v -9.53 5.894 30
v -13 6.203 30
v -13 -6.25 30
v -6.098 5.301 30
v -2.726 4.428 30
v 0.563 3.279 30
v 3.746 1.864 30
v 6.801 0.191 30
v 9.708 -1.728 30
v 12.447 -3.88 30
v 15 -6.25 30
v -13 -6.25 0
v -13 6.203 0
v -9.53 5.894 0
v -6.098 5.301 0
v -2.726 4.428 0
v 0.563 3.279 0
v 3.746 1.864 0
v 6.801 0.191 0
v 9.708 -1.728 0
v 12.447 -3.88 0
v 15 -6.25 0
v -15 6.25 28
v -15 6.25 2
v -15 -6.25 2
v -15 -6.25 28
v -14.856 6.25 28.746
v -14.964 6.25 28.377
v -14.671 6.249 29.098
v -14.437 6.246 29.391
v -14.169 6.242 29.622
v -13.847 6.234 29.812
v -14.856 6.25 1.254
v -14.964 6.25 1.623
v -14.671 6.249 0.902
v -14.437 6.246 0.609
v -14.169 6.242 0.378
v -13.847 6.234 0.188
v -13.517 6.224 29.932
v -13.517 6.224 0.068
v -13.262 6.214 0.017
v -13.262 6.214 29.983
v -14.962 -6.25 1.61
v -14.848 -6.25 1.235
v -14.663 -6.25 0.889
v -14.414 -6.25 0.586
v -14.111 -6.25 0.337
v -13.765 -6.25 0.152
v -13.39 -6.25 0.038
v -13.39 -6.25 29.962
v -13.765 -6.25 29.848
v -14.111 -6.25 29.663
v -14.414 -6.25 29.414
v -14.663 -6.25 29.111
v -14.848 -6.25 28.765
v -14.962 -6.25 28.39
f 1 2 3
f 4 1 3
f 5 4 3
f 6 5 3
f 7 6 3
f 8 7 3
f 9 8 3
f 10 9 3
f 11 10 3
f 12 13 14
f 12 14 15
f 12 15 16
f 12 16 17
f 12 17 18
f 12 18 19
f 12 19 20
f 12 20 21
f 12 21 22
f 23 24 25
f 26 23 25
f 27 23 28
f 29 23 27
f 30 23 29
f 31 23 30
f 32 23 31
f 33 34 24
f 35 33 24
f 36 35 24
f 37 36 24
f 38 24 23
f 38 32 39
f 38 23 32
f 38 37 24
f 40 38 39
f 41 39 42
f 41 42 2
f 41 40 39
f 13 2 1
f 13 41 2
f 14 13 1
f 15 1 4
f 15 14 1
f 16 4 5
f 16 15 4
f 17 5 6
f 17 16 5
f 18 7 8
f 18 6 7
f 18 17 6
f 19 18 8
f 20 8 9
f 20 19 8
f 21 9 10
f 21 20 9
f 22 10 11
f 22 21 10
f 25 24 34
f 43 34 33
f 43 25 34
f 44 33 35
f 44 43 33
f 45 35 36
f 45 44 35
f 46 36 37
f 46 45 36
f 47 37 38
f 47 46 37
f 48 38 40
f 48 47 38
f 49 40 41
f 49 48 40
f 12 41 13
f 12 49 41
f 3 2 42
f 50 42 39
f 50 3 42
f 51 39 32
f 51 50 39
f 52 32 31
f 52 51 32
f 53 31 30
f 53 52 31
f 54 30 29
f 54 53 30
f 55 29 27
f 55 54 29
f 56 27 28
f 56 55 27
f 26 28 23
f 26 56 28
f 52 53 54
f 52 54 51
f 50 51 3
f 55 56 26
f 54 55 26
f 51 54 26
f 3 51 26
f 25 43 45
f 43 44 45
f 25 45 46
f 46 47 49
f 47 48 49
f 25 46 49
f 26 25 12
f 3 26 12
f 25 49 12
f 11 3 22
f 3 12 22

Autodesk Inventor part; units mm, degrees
ref_plane "YZ Plane" through (0, 0, 0) normal (1, 0, 0) x (0, 1, 0)
ref_plane "XZ Plane" through (0, 0, 0) normal (0, 1, 0) x (-1, 0, 0)
ref_plane "XY Plane" through (0, 0, 0) normal (0, 0, 1) x (1, 0, 0)
sketch "Sketch1" plane through (0, 0, 0) normal (0, 0, 1) x (1, 0, 0)
  line L0 (-15, -6.25) -> (15, -6.25)
  line L1 (15, -6.25) -> (15, 6.25)
  line L2 (15, 6.25) -> (-15, 6.25)
  line L3 (-15, 6.25) -> (-15, -6.25)
  line L4 (-15, -6.25) -> (15, 6.25) construction
  line L5 (15, -6.25) -> (-15, 6.25) construction
  arc A0 (15, -6.25) -> (-15, 6.25) centre (-15, -36) ccw
  point P0 (0, 0)
  dimension "d0" = 30
  dimension "d1" = 12.5
extrude "Extrusion1" add sketch "Sketch1" along normal blind 30 contours L3 A0 L0
fillet "Fillet1" radius 2 2 edges at (-15, 0, 30) (-15, 0, 0)
properties part number "linear_stop_brackets"
